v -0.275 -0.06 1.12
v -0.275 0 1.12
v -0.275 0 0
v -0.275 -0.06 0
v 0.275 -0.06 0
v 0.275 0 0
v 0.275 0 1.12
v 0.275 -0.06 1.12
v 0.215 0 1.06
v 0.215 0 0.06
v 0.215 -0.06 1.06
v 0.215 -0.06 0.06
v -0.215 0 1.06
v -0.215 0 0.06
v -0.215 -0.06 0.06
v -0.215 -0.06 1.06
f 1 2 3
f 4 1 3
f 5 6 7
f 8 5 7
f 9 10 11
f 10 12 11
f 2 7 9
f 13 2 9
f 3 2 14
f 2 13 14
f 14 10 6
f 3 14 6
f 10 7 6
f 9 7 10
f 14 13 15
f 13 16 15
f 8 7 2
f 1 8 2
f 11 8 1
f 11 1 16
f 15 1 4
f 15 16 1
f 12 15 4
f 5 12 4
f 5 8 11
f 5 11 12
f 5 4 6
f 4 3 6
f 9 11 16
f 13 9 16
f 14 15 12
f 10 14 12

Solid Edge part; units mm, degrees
sketch "Sketch1" plane through (0, 0, 0) normal (0, -1, 0) x (1, 0, 0)
  line L0 (-0.275, 0) -> (0.275, 0)
  line L1 (0.275, 0) -> (0.275, 1.12)
  line L2 (0.275, 1.12) -> (-0.275, 1.12)
  line L3 (-0.275, 1.12) -> (-0.275, 0)
  dimension "D1" = 1.12
  dimension "D2" = 0.55
extrude "Protrusion1" add sketch "Sketch1" along normal blind 0.06
sketch "Sketch2" plane through (0, -0.06, 0.75) normal (0, -1, 0) x (1, 0, 0)
  line L0 (-0.215, -0.69) -> (0.215, -0.69)
  line L1 (0.215, -0.69) -> (0.215, 0.31)
  line L2 (0.215, 0.31) -> (-0.215, 0.31)
  line L3 (-0.215, 0.31) -> (-0.215, -0.69)
  dimension "D1" = 0.06
extrude "Cutout1" cut sketch "Sketch2" against normal up to next
